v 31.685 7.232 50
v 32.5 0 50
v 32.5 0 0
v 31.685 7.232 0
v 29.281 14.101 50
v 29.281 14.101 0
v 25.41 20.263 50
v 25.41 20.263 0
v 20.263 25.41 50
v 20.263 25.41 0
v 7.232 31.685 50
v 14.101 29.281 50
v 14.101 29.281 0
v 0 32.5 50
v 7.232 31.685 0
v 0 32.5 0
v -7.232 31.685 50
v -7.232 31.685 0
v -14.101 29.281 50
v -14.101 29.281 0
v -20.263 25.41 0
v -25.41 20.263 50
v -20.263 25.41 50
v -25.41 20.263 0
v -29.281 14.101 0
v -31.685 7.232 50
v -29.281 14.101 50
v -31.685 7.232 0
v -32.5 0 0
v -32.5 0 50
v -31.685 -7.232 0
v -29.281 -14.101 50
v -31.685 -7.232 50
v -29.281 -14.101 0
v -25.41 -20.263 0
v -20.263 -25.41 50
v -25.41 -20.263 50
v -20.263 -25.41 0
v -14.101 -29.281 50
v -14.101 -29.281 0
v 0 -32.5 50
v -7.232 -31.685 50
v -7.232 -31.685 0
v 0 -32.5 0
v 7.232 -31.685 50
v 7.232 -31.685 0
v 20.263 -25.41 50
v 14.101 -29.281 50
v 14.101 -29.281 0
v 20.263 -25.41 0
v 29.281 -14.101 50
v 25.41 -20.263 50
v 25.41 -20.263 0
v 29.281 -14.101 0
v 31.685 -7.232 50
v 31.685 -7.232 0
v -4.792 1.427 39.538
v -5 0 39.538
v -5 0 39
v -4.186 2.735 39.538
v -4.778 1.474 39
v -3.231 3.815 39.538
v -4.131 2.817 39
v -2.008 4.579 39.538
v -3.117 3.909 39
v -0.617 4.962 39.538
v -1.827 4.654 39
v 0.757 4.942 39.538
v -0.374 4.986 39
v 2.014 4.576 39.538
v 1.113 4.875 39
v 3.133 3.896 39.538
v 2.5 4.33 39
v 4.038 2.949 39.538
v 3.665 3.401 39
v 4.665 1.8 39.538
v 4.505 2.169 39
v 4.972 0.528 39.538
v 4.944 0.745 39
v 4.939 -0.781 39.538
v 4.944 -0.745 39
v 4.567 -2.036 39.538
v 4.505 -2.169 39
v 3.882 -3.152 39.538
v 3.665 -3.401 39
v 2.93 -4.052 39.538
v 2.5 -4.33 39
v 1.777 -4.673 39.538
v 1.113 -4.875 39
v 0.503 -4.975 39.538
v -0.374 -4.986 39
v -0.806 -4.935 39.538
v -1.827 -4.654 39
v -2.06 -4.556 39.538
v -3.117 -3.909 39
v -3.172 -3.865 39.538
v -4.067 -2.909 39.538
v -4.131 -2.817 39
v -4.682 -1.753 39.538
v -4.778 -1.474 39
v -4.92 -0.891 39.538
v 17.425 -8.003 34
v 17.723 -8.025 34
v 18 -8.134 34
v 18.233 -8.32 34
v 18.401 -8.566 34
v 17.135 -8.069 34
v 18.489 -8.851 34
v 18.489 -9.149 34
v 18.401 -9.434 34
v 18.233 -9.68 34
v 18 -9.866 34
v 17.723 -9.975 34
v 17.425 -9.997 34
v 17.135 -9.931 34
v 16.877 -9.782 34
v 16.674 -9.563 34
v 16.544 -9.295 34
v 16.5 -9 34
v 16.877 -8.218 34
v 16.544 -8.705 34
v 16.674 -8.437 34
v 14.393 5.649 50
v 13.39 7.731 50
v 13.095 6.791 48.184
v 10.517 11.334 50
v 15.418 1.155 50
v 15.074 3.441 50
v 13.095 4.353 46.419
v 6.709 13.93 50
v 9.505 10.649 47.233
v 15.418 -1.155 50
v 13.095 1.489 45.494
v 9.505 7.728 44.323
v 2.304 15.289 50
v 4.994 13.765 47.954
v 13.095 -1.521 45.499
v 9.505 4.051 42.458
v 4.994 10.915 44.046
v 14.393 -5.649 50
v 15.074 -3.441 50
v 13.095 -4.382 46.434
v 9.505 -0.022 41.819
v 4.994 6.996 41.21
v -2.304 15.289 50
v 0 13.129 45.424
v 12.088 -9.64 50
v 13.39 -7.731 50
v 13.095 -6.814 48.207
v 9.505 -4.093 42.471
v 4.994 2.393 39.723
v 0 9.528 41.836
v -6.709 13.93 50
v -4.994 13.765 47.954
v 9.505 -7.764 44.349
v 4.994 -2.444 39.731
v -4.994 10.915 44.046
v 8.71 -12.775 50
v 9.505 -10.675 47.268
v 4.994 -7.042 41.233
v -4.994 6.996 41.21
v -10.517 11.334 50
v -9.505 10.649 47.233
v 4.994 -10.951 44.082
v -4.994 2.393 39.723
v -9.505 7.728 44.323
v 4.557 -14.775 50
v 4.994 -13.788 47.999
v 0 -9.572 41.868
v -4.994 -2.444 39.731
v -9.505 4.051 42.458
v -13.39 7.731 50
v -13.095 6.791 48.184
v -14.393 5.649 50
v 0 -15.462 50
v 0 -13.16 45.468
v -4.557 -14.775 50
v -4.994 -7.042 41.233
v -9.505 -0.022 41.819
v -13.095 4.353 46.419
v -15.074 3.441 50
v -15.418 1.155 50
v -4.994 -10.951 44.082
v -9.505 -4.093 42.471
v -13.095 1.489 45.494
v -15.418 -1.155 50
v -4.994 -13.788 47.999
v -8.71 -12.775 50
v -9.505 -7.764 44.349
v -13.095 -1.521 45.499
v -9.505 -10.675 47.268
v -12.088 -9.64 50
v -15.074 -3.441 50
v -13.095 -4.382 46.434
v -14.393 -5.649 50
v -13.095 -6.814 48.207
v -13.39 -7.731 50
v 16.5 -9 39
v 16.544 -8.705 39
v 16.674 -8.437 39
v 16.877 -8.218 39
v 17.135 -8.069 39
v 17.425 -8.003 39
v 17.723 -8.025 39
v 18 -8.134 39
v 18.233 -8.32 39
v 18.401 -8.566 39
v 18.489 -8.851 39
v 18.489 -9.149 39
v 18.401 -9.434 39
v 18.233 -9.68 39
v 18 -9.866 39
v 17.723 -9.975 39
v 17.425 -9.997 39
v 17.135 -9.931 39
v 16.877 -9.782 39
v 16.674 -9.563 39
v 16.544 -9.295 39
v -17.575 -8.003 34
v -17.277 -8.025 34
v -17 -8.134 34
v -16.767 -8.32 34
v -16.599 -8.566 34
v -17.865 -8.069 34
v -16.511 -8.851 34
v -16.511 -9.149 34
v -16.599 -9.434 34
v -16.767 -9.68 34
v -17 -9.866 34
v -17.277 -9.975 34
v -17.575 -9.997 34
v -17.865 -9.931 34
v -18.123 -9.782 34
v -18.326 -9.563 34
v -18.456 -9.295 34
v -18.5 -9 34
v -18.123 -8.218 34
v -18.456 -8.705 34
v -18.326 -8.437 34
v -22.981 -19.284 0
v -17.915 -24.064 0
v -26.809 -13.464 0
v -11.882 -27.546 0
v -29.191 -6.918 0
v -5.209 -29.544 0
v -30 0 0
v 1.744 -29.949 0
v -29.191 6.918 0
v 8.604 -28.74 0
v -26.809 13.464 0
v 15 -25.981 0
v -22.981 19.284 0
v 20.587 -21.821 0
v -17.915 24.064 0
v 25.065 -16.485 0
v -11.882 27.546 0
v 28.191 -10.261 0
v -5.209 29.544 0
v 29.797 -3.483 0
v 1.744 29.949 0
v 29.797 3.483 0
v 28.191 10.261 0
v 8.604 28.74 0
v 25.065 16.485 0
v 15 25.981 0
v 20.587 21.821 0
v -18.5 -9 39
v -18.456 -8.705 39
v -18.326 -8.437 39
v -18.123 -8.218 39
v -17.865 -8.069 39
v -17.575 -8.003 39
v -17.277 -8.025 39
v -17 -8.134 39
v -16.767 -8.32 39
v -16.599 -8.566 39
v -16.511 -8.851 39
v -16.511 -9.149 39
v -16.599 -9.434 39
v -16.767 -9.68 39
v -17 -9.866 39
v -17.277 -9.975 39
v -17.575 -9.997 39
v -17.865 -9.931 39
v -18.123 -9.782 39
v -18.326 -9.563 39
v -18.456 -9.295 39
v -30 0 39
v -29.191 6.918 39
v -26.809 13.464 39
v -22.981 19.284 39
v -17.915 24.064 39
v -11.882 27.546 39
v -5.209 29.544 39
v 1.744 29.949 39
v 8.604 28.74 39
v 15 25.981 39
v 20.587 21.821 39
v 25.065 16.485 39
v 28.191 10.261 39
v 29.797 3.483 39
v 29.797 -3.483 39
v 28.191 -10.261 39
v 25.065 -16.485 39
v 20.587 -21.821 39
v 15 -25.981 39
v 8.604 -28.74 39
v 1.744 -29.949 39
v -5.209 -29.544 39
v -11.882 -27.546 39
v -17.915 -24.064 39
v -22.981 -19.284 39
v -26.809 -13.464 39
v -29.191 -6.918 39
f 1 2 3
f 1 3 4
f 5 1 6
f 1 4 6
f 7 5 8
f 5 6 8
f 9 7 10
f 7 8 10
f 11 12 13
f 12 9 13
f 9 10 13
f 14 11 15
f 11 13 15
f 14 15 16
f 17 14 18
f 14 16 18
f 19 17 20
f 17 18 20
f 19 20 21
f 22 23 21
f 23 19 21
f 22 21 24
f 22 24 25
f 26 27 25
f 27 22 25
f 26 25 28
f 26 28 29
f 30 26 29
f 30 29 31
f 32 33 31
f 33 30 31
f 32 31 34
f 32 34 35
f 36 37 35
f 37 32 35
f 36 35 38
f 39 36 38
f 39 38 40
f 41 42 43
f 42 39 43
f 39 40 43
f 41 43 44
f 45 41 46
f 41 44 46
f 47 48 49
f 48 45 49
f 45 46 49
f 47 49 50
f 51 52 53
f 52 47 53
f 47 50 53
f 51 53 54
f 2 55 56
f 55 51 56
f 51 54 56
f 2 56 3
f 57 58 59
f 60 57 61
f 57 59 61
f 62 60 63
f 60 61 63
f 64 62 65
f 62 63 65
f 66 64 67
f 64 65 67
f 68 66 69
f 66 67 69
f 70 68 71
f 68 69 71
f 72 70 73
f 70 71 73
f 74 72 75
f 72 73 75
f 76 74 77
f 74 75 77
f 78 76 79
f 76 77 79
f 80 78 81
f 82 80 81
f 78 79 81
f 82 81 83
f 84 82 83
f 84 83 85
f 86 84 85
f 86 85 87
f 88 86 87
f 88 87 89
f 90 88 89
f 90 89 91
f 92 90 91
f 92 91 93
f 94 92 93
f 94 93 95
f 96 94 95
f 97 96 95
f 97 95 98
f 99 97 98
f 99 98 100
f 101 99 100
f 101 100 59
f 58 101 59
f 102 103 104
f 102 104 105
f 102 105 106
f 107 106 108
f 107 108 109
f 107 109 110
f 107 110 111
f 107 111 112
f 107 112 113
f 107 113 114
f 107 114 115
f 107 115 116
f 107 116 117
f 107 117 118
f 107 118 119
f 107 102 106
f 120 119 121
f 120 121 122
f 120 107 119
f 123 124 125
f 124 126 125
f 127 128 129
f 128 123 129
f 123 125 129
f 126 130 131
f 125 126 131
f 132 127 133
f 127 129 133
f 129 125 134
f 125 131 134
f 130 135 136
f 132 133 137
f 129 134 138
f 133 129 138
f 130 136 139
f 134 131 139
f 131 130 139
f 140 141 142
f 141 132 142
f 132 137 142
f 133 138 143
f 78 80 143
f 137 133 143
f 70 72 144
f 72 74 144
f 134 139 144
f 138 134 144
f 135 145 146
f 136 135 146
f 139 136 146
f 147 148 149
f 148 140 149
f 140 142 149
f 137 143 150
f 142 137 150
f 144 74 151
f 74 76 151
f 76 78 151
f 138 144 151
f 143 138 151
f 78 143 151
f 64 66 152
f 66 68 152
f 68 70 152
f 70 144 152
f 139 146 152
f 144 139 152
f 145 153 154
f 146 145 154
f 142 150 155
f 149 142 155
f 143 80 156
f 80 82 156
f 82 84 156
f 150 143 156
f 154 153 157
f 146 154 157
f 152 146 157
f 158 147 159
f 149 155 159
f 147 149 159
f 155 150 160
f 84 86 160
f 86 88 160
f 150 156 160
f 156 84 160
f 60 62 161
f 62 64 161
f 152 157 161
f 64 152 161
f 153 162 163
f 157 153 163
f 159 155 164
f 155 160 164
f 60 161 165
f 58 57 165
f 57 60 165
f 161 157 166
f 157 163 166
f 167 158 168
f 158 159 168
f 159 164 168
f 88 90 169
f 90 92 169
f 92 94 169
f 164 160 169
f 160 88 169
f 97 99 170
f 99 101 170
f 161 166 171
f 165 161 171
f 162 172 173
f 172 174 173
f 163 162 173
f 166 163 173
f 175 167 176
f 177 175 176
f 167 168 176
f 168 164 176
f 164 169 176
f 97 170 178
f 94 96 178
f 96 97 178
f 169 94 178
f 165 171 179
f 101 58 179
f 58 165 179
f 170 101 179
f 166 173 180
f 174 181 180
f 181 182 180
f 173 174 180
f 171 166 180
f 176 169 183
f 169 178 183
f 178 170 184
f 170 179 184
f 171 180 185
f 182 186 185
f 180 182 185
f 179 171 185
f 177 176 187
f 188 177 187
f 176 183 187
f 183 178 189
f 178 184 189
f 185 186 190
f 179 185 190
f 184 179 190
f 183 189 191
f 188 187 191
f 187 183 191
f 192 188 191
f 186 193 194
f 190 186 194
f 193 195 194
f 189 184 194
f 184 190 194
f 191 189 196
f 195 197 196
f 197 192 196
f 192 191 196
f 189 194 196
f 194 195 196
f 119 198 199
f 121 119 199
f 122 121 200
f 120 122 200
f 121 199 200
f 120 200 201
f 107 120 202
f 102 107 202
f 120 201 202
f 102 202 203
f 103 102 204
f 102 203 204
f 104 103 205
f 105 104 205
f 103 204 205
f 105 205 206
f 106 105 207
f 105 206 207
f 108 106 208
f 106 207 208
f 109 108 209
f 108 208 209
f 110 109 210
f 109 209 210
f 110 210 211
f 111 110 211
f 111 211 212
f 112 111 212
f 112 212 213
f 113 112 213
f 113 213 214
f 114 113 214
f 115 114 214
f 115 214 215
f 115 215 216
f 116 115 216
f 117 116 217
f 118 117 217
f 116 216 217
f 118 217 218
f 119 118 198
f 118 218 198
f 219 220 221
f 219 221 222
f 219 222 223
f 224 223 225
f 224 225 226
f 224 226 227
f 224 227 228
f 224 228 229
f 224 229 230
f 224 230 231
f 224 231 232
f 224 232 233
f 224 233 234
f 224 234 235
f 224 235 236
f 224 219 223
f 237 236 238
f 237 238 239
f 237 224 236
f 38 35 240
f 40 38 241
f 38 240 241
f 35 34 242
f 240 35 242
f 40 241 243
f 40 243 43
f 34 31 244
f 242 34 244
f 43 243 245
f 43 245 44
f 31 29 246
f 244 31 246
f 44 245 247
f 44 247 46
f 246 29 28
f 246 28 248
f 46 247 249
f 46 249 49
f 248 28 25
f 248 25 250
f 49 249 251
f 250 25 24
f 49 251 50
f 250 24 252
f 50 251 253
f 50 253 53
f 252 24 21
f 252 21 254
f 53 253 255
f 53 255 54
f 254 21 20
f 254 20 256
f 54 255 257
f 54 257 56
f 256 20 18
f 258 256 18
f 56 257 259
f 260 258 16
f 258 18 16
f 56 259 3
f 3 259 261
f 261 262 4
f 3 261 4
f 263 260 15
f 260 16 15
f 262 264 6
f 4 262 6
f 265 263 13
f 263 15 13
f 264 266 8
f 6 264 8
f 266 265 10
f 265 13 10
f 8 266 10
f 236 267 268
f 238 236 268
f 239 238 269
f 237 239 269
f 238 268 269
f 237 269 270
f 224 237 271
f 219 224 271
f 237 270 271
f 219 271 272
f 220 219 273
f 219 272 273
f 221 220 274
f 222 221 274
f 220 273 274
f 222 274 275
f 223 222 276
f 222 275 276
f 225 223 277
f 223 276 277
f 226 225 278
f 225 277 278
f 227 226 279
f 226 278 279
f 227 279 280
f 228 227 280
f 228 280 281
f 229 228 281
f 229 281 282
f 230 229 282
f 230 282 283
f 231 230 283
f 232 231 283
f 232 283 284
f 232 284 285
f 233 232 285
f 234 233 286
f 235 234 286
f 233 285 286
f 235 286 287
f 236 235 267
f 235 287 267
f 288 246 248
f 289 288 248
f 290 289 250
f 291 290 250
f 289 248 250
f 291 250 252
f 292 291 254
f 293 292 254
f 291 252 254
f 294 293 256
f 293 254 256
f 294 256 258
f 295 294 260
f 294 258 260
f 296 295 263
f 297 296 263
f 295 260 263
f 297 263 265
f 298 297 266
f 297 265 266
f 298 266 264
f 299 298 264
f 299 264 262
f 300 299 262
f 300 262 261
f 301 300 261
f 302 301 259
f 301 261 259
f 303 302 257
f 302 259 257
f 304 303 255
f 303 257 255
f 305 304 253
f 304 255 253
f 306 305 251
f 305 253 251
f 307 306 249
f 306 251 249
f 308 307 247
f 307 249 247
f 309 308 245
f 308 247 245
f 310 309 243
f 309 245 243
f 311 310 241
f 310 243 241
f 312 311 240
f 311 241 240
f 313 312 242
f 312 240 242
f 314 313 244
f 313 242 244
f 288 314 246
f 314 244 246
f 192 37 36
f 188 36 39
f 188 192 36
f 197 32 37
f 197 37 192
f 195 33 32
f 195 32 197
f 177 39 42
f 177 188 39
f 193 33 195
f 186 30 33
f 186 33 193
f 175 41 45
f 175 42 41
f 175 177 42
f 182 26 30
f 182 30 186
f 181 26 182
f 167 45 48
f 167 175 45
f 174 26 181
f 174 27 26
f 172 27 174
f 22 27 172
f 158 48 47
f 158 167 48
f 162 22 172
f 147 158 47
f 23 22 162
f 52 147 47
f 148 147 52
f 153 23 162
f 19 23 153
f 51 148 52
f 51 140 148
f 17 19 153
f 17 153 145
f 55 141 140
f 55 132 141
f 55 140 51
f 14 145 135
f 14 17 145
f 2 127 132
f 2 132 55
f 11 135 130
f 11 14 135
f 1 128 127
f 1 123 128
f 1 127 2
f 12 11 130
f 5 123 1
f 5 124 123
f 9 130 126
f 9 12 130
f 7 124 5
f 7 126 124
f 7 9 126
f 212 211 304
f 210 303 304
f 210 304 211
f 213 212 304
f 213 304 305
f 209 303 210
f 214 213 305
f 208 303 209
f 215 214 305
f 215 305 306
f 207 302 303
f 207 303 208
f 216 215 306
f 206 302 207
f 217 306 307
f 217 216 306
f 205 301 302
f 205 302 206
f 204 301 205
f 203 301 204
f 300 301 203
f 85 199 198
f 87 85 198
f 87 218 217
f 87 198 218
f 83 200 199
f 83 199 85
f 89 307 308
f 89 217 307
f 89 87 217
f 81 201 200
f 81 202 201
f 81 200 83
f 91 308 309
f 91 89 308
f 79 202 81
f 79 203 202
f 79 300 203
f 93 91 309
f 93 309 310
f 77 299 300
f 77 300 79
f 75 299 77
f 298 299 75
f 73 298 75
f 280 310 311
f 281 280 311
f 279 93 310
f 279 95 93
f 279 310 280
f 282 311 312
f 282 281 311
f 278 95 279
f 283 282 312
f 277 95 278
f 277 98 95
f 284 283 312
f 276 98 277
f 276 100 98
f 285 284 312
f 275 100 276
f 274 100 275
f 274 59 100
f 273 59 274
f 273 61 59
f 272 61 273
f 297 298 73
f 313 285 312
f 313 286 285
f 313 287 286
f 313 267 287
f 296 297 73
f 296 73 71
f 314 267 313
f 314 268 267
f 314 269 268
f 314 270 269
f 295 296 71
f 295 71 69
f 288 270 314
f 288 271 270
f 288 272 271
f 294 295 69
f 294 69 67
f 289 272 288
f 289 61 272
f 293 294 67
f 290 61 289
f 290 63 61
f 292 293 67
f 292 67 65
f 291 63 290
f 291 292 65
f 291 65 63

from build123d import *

# Parameters (mm, degrees)
SKETCH2_R           = 32.5
BOSS_EXTRUDE1_DEPTH = 60
CUT_REVOLVE1_ANGLE  = 180
CUT_EXTRUDE1_REACH  = 12
SKETCH5_W           = 97.630906447
SKETCH5_H           = 85.301230118
SKETCH7_R           = 30
CUT_EXTRUDE3_DEPTH  = 39
SKETCH8_R           = 1
BOSS_EXTRUDE2_DEPTH = 5
SKETCH9_R           = 5
CUT_EXTRUDE4_DEPTH  = 1


with BuildPart() as part:
    # Sketch2 → Boss-Extrude1 (new body)
    with BuildSketch(Plane.XY):
        Circle(SKETCH2_R)
    extrude(amount=BOSS_EXTRUDE1_DEPTH)

    # Sketch4 → Cut-Revolve1 (revolve, cut)
    with BuildSketch(Plane.XY.offset(55)):
        with BuildLine():
            Line((-16.25, 0), (16.25, 0))
            ThreePointArc((16.25, 0), (0, 16.25), (-16.25, 0))
        make_face()
    revolve(axis=Axis((-16.25, 0, 55), (-1, 0, 0)), revolution_arc=CUT_REVOLVE1_ANGLE, mode=Mode.SUBTRACT)

    # Sketch5 → Cut-Extrude1 (cut, up to next)
    with BuildSketch(Plane.XY.offset(50), mode=Mode.PRIVATE) as cut_extrude1_sk1:
        with Locations((-1.59772985, 0.365427289)):
            Rectangle(SKETCH5_W, SKETCH5_H)
    cut_extrude1_tool1 = extrude(cut_extrude1_sk1.sketch, amount=CUT_EXTRUDE1_REACH, mode=Mode.PRIVATE) & part.part
    add(cut_extrude1_tool1.solids().sort_by_distance((-1.59773, 0.365427, 50))[0], mode=Mode.SUBTRACT)

    # Sketch7 → Cut-Extrude3 (cut)
    with BuildSketch(Plane(origin=(0, 0, 0), x_dir=(-1, 0, 0), z_dir=(0, 0, -1))):
        Circle(SKETCH7_R)
    extrude(amount=-CUT_EXTRUDE3_DEPTH, mode=Mode.SUBTRACT)

    # Sketch8 → Boss-Extrude2 (add)
    with BuildSketch(Plane(origin=(0, 0, 39), x_dir=(-1, 0, 0), z_dir=(0, 0, -1))):
        with Locations((17.5, -9)):
            Circle(SKETCH8_R)
        with Locations((-17.5, -9)):
            Circle(SKETCH8_R)
    extrude(amount=BOSS_EXTRUDE2_DEPTH)

    # Sketch9 → Cut-Extrude4 (cut)
    with BuildSketch(Plane(origin=(0, 0, 39), x_dir=(-1, 0, 0), z_dir=(0, 0, -1))):
        Circle(SKETCH9_R)
    extrude(amount=-CUT_EXTRUDE4_DEPTH, mode=Mode.SUBTRACT)


solid = part.part
